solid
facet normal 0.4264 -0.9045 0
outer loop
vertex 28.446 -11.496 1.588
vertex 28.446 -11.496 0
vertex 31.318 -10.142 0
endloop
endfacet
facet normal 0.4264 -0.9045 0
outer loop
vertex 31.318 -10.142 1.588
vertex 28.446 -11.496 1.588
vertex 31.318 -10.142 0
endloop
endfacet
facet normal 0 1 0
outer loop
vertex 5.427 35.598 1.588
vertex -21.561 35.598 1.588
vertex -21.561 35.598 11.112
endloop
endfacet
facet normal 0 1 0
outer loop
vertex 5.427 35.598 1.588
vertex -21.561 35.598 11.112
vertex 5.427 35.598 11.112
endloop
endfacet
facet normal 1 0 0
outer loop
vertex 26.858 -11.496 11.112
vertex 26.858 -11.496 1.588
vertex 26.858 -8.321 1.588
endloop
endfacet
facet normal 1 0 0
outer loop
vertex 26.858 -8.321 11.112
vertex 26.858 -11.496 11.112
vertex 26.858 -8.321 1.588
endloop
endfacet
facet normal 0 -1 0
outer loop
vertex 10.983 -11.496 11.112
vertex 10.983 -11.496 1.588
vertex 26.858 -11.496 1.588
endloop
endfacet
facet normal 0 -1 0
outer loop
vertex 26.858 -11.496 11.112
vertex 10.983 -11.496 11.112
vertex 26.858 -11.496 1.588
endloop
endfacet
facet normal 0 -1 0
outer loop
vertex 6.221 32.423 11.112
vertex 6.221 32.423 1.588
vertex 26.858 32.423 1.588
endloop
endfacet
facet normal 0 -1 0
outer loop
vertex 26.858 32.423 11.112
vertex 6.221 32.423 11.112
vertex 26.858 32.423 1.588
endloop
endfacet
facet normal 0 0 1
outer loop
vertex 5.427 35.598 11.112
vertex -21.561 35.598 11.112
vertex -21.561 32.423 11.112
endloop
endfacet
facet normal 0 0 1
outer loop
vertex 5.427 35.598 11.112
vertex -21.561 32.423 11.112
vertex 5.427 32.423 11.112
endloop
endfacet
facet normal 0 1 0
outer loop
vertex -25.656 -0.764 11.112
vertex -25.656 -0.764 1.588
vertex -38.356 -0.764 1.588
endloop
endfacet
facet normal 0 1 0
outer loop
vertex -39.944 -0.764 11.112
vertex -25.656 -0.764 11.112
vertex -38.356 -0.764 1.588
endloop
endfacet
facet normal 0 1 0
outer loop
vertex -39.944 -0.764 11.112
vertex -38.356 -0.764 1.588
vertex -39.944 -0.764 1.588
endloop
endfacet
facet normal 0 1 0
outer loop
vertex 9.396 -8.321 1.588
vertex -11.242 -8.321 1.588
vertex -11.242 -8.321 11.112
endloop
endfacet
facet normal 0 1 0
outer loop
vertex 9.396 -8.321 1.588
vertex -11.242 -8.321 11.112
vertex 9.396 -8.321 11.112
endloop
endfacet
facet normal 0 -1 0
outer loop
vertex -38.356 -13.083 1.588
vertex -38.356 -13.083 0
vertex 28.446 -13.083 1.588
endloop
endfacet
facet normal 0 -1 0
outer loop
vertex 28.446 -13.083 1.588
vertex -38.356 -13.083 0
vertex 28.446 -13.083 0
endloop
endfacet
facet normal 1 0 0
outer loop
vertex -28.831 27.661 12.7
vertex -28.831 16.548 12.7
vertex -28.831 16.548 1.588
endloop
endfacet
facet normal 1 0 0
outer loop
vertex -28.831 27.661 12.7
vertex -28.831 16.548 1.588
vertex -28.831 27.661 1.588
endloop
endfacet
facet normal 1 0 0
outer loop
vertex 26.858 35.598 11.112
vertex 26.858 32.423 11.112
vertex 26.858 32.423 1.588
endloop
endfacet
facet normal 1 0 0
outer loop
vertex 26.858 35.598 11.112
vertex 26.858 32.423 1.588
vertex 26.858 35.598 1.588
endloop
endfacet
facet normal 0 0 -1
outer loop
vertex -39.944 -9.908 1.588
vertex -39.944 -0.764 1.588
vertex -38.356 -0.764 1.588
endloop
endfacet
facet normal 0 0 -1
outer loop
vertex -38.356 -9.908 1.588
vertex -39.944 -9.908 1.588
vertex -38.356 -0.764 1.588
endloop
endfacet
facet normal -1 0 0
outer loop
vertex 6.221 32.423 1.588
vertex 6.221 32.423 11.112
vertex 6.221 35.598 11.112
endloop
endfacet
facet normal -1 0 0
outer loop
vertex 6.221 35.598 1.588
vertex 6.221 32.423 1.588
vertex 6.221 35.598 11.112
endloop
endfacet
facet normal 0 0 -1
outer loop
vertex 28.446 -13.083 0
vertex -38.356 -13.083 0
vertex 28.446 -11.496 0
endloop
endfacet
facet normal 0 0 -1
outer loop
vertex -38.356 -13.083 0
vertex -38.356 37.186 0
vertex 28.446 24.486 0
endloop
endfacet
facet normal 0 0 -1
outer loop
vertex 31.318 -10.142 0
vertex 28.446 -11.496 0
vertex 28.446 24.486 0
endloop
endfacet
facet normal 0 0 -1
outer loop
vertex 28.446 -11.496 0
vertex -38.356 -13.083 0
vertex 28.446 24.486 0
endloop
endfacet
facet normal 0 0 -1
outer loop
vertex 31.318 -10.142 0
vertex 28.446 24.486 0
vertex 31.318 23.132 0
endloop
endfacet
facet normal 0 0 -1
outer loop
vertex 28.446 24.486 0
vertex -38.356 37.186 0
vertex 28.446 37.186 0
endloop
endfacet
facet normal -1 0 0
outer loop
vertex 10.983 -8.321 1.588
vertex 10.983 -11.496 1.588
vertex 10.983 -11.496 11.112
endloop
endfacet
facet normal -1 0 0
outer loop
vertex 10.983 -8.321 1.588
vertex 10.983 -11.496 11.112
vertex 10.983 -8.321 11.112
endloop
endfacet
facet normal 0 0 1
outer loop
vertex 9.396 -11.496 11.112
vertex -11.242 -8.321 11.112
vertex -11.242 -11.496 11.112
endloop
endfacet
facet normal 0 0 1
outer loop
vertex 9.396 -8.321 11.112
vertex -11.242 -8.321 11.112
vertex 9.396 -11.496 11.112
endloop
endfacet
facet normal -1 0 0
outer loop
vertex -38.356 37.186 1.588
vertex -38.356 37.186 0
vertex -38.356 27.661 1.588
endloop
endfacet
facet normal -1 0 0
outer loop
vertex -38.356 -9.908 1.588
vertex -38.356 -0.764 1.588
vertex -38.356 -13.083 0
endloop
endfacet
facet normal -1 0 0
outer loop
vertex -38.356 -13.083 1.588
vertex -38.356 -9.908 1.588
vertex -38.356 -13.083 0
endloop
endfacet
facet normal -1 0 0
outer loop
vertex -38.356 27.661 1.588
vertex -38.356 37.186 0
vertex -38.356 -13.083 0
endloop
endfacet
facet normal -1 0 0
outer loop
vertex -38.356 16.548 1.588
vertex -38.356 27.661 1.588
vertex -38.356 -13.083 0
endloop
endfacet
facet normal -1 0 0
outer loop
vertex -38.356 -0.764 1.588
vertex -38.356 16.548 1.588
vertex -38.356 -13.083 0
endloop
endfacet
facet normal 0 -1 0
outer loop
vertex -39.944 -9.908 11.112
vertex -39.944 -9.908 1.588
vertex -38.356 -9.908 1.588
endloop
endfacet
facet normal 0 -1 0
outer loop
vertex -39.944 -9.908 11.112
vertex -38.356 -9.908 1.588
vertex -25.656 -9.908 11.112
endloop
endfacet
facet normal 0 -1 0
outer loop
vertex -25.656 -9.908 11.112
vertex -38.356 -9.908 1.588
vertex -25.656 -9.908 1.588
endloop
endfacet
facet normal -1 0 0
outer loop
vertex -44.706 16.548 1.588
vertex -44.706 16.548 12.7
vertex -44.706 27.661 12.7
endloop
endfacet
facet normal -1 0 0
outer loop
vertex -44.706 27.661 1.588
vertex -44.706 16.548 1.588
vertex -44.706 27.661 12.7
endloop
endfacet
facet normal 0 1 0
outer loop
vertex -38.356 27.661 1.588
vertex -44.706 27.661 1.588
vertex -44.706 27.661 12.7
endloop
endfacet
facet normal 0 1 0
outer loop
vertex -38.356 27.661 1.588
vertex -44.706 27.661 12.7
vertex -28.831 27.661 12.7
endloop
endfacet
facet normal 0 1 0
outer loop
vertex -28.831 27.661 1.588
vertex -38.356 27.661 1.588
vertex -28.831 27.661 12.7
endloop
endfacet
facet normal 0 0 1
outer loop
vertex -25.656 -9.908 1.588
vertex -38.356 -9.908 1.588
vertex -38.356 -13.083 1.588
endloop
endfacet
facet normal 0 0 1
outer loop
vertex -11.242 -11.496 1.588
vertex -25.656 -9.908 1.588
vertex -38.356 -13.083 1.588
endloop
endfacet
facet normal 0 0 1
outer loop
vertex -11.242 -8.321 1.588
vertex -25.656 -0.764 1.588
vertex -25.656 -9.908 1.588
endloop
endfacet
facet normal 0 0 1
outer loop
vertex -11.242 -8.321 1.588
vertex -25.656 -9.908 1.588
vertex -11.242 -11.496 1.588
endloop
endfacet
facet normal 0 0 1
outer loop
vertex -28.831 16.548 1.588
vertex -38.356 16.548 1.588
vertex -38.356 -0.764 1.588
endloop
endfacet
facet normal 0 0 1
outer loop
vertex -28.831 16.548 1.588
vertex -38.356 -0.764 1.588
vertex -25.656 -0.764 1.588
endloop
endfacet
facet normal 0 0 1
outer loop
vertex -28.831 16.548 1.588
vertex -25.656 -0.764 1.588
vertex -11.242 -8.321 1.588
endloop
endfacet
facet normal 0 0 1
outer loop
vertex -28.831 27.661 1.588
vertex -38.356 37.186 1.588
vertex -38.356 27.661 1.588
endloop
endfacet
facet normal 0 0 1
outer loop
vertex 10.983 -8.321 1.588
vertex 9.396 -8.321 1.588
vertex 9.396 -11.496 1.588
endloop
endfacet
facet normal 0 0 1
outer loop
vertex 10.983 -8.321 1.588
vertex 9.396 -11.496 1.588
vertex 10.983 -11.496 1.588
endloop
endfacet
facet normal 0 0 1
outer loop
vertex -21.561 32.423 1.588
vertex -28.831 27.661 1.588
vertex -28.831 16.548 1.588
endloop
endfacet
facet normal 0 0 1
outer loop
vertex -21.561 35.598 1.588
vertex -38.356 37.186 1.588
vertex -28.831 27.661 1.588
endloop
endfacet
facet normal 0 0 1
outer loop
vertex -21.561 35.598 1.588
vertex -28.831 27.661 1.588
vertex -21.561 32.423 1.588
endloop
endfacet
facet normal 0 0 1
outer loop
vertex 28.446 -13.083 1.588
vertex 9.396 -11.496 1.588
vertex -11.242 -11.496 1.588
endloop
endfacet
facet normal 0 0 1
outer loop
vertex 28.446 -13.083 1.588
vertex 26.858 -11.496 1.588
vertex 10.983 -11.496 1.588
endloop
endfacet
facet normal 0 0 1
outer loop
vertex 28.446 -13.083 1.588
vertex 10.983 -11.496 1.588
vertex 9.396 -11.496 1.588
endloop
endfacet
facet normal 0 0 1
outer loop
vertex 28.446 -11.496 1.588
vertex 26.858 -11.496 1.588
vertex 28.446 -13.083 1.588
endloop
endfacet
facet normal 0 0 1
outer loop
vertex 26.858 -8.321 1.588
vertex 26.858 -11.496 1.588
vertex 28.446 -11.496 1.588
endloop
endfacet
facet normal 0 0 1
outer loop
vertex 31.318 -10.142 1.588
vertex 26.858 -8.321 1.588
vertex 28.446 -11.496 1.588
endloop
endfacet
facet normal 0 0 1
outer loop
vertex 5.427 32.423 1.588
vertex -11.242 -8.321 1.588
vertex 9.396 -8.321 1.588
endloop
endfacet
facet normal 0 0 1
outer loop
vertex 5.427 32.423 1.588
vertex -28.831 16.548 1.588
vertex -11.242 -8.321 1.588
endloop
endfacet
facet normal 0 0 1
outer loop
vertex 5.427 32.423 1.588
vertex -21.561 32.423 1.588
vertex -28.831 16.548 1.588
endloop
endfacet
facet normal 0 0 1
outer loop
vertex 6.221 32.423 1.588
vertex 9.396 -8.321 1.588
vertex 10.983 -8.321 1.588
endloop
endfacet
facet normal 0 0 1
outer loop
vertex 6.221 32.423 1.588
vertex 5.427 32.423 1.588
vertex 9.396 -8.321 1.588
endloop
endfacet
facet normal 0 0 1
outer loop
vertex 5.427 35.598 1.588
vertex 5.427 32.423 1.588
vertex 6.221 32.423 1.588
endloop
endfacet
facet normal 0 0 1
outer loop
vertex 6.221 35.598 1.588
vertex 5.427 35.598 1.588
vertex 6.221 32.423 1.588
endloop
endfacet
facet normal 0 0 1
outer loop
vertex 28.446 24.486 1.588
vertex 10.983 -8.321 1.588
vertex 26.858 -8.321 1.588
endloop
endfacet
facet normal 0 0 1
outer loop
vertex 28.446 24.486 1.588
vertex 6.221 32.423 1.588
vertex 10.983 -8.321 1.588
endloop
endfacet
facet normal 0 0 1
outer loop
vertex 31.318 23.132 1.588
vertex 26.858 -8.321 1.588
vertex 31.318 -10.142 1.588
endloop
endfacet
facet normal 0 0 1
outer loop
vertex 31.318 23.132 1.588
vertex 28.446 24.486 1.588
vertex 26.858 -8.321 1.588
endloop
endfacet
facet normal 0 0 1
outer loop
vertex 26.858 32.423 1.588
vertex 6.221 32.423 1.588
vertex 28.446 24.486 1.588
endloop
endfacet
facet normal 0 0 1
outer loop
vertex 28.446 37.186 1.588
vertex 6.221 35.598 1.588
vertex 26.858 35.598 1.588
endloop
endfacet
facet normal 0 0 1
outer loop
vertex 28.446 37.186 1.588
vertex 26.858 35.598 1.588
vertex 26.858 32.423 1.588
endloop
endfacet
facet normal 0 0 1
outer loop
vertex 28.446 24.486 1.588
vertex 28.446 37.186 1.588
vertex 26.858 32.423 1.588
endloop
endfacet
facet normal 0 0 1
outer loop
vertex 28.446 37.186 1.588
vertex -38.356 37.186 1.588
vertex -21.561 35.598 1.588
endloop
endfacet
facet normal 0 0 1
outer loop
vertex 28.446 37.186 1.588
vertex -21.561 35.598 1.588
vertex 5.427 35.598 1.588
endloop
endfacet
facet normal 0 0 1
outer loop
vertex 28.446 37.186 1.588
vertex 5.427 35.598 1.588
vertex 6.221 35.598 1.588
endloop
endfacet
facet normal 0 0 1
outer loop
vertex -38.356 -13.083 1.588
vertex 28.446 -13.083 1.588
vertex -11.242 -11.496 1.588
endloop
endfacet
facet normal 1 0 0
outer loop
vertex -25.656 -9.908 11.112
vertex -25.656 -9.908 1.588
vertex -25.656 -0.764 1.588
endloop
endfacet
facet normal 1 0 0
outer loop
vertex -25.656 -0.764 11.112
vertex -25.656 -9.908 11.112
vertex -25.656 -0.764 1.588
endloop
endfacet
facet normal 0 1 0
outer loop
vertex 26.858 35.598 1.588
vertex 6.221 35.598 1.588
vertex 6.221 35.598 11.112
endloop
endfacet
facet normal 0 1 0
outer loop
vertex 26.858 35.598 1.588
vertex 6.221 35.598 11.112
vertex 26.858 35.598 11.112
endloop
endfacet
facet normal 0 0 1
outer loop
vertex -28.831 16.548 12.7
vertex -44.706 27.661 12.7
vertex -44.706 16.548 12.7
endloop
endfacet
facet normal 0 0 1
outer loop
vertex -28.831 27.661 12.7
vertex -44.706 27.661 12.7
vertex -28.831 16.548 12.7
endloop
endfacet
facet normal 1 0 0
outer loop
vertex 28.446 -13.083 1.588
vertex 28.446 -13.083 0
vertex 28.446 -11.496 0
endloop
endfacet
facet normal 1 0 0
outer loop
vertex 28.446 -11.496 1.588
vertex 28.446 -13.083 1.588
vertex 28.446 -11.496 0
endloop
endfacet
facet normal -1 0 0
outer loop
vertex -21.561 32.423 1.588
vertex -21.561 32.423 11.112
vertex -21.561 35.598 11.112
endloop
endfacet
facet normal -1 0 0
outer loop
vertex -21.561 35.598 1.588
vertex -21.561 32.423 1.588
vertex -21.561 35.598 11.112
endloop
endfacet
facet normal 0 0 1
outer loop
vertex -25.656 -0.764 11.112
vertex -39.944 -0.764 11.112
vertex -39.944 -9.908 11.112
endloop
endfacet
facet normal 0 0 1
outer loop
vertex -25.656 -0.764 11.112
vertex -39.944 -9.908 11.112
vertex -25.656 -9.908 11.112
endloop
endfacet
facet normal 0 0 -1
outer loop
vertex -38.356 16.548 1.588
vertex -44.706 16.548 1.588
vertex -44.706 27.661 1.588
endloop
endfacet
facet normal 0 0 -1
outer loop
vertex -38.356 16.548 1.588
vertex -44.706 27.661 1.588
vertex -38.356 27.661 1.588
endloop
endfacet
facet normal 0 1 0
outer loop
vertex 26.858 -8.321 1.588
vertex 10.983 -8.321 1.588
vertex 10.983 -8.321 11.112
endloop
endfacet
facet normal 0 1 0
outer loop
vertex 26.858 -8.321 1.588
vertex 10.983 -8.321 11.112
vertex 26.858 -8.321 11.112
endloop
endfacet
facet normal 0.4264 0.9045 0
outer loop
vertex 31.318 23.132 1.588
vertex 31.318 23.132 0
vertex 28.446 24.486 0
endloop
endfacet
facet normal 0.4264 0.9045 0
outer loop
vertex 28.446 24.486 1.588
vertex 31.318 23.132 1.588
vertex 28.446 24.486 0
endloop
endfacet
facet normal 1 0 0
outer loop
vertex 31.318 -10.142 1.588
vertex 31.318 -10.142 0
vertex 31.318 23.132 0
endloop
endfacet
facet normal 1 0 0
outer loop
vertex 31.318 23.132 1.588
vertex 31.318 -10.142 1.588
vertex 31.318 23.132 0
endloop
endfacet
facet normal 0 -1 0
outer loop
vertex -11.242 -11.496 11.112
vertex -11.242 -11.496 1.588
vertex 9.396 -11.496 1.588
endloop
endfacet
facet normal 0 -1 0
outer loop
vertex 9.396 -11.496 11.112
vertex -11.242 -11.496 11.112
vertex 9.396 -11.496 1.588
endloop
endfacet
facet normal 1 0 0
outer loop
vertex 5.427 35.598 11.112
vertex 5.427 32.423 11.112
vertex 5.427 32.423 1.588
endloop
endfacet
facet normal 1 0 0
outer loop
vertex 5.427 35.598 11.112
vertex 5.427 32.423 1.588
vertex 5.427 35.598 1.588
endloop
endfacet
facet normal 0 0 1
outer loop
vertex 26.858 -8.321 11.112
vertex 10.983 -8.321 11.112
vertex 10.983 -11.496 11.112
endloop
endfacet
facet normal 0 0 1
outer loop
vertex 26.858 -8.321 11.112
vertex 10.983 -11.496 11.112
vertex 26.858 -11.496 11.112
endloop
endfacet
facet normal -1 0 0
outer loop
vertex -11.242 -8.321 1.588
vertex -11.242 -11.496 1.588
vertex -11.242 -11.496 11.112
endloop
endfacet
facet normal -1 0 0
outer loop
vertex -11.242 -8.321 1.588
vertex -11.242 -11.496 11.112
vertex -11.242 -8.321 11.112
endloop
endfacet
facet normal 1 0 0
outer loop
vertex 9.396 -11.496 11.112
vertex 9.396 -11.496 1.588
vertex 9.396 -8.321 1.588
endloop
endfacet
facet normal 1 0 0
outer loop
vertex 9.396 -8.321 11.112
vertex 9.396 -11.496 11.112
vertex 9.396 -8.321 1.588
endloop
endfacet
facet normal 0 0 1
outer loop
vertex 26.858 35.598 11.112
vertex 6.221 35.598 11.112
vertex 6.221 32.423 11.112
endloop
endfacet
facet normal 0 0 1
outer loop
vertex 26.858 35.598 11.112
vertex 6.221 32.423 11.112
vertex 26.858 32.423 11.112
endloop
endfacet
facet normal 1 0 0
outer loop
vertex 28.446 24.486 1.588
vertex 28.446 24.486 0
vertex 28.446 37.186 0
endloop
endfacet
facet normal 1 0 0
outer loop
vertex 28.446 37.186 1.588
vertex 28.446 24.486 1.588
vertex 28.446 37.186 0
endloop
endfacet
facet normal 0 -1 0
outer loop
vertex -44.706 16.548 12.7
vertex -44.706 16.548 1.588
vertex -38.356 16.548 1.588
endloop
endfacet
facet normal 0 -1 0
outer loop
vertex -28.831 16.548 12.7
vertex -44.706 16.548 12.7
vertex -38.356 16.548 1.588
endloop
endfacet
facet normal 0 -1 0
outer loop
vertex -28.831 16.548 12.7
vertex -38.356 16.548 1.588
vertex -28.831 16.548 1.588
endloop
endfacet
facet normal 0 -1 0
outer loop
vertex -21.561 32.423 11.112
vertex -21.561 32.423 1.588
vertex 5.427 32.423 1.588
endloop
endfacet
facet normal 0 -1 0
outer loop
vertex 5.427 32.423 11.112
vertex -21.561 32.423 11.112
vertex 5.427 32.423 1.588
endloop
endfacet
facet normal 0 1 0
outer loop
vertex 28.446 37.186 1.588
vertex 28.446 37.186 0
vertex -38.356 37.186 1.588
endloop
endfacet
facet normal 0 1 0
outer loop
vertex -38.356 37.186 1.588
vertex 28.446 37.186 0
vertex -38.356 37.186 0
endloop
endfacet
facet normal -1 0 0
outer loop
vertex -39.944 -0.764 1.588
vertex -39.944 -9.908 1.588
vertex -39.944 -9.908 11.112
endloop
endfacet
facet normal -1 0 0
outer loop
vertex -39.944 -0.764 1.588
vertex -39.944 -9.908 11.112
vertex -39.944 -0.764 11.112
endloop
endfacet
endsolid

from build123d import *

# Parameters (mm, degrees)
F1_DEPTH = 1.5875
F2_W     = 15.875
F2_H     = 11.1125
F3_DEPTH = 11.1125
F4_W     = 1.5875
F4_H     = 9.144
F4_W_2   = 12.7
F5_DEPTH = 9.525
F6_W     = 26.9875
F6_H     = 3.175
F6_W_2   = 20.6375
F6_W_3   = 15.875
F7_DEPTH = 9.525


with BuildPart() as f1:
    # F0 (on Top) → F1 (new body)
    with BuildSketch(Plane.XY):
        Polygon((-38.356409, 37.185692), (-38.356409, -13.083157), (28.445591, -13.083157), (28.445591, -11.495657), (31.317557, -10.141982), (31.317557, 23.132018), (28.445591, 24.485692), (28.445591, 37.185692), align=None)
    extrude(amount=F1_DEPTH)

    # F2 (on face) → F3 (join)
    with BuildSketch(Plane.XY.offset(1.5875)):
        with Locations((-36.768909, 22.104442)):
            Rectangle(F2_W, F2_H)
    extrude(amount=F3_DEPTH)

    # F4 (on face) → F5 (join)
    with BuildSketch(Plane.XY.offset(1.5875)):
        with Locations((-39.150159, -5.336157)):
            Rectangle(F4_W, F4_H)
        with Locations((-32.006409, -5.336157)):
            Rectangle(F4_W_2, F4_H)
    extrude(amount=F5_DEPTH)

    # F6 (on face) → F7 (join)
    with BuildSketch(Plane.XY.offset(1.5875)):
        with Locations((-8.066909, 34.010692)):
            Rectangle(F6_W, F6_H)
        with Locations((16.539341, 34.010692)):
            Rectangle(F6_W_2, F6_H)
        with Locations((-0.923159, -9.908157)):
            Rectangle(F6_W_2, F6_H)
        with Locations((18.920591, -9.908157)):
            Rectangle(F6_W_3, F6_H)
    extrude(amount=F7_DEPTH)


solid = f1.part
